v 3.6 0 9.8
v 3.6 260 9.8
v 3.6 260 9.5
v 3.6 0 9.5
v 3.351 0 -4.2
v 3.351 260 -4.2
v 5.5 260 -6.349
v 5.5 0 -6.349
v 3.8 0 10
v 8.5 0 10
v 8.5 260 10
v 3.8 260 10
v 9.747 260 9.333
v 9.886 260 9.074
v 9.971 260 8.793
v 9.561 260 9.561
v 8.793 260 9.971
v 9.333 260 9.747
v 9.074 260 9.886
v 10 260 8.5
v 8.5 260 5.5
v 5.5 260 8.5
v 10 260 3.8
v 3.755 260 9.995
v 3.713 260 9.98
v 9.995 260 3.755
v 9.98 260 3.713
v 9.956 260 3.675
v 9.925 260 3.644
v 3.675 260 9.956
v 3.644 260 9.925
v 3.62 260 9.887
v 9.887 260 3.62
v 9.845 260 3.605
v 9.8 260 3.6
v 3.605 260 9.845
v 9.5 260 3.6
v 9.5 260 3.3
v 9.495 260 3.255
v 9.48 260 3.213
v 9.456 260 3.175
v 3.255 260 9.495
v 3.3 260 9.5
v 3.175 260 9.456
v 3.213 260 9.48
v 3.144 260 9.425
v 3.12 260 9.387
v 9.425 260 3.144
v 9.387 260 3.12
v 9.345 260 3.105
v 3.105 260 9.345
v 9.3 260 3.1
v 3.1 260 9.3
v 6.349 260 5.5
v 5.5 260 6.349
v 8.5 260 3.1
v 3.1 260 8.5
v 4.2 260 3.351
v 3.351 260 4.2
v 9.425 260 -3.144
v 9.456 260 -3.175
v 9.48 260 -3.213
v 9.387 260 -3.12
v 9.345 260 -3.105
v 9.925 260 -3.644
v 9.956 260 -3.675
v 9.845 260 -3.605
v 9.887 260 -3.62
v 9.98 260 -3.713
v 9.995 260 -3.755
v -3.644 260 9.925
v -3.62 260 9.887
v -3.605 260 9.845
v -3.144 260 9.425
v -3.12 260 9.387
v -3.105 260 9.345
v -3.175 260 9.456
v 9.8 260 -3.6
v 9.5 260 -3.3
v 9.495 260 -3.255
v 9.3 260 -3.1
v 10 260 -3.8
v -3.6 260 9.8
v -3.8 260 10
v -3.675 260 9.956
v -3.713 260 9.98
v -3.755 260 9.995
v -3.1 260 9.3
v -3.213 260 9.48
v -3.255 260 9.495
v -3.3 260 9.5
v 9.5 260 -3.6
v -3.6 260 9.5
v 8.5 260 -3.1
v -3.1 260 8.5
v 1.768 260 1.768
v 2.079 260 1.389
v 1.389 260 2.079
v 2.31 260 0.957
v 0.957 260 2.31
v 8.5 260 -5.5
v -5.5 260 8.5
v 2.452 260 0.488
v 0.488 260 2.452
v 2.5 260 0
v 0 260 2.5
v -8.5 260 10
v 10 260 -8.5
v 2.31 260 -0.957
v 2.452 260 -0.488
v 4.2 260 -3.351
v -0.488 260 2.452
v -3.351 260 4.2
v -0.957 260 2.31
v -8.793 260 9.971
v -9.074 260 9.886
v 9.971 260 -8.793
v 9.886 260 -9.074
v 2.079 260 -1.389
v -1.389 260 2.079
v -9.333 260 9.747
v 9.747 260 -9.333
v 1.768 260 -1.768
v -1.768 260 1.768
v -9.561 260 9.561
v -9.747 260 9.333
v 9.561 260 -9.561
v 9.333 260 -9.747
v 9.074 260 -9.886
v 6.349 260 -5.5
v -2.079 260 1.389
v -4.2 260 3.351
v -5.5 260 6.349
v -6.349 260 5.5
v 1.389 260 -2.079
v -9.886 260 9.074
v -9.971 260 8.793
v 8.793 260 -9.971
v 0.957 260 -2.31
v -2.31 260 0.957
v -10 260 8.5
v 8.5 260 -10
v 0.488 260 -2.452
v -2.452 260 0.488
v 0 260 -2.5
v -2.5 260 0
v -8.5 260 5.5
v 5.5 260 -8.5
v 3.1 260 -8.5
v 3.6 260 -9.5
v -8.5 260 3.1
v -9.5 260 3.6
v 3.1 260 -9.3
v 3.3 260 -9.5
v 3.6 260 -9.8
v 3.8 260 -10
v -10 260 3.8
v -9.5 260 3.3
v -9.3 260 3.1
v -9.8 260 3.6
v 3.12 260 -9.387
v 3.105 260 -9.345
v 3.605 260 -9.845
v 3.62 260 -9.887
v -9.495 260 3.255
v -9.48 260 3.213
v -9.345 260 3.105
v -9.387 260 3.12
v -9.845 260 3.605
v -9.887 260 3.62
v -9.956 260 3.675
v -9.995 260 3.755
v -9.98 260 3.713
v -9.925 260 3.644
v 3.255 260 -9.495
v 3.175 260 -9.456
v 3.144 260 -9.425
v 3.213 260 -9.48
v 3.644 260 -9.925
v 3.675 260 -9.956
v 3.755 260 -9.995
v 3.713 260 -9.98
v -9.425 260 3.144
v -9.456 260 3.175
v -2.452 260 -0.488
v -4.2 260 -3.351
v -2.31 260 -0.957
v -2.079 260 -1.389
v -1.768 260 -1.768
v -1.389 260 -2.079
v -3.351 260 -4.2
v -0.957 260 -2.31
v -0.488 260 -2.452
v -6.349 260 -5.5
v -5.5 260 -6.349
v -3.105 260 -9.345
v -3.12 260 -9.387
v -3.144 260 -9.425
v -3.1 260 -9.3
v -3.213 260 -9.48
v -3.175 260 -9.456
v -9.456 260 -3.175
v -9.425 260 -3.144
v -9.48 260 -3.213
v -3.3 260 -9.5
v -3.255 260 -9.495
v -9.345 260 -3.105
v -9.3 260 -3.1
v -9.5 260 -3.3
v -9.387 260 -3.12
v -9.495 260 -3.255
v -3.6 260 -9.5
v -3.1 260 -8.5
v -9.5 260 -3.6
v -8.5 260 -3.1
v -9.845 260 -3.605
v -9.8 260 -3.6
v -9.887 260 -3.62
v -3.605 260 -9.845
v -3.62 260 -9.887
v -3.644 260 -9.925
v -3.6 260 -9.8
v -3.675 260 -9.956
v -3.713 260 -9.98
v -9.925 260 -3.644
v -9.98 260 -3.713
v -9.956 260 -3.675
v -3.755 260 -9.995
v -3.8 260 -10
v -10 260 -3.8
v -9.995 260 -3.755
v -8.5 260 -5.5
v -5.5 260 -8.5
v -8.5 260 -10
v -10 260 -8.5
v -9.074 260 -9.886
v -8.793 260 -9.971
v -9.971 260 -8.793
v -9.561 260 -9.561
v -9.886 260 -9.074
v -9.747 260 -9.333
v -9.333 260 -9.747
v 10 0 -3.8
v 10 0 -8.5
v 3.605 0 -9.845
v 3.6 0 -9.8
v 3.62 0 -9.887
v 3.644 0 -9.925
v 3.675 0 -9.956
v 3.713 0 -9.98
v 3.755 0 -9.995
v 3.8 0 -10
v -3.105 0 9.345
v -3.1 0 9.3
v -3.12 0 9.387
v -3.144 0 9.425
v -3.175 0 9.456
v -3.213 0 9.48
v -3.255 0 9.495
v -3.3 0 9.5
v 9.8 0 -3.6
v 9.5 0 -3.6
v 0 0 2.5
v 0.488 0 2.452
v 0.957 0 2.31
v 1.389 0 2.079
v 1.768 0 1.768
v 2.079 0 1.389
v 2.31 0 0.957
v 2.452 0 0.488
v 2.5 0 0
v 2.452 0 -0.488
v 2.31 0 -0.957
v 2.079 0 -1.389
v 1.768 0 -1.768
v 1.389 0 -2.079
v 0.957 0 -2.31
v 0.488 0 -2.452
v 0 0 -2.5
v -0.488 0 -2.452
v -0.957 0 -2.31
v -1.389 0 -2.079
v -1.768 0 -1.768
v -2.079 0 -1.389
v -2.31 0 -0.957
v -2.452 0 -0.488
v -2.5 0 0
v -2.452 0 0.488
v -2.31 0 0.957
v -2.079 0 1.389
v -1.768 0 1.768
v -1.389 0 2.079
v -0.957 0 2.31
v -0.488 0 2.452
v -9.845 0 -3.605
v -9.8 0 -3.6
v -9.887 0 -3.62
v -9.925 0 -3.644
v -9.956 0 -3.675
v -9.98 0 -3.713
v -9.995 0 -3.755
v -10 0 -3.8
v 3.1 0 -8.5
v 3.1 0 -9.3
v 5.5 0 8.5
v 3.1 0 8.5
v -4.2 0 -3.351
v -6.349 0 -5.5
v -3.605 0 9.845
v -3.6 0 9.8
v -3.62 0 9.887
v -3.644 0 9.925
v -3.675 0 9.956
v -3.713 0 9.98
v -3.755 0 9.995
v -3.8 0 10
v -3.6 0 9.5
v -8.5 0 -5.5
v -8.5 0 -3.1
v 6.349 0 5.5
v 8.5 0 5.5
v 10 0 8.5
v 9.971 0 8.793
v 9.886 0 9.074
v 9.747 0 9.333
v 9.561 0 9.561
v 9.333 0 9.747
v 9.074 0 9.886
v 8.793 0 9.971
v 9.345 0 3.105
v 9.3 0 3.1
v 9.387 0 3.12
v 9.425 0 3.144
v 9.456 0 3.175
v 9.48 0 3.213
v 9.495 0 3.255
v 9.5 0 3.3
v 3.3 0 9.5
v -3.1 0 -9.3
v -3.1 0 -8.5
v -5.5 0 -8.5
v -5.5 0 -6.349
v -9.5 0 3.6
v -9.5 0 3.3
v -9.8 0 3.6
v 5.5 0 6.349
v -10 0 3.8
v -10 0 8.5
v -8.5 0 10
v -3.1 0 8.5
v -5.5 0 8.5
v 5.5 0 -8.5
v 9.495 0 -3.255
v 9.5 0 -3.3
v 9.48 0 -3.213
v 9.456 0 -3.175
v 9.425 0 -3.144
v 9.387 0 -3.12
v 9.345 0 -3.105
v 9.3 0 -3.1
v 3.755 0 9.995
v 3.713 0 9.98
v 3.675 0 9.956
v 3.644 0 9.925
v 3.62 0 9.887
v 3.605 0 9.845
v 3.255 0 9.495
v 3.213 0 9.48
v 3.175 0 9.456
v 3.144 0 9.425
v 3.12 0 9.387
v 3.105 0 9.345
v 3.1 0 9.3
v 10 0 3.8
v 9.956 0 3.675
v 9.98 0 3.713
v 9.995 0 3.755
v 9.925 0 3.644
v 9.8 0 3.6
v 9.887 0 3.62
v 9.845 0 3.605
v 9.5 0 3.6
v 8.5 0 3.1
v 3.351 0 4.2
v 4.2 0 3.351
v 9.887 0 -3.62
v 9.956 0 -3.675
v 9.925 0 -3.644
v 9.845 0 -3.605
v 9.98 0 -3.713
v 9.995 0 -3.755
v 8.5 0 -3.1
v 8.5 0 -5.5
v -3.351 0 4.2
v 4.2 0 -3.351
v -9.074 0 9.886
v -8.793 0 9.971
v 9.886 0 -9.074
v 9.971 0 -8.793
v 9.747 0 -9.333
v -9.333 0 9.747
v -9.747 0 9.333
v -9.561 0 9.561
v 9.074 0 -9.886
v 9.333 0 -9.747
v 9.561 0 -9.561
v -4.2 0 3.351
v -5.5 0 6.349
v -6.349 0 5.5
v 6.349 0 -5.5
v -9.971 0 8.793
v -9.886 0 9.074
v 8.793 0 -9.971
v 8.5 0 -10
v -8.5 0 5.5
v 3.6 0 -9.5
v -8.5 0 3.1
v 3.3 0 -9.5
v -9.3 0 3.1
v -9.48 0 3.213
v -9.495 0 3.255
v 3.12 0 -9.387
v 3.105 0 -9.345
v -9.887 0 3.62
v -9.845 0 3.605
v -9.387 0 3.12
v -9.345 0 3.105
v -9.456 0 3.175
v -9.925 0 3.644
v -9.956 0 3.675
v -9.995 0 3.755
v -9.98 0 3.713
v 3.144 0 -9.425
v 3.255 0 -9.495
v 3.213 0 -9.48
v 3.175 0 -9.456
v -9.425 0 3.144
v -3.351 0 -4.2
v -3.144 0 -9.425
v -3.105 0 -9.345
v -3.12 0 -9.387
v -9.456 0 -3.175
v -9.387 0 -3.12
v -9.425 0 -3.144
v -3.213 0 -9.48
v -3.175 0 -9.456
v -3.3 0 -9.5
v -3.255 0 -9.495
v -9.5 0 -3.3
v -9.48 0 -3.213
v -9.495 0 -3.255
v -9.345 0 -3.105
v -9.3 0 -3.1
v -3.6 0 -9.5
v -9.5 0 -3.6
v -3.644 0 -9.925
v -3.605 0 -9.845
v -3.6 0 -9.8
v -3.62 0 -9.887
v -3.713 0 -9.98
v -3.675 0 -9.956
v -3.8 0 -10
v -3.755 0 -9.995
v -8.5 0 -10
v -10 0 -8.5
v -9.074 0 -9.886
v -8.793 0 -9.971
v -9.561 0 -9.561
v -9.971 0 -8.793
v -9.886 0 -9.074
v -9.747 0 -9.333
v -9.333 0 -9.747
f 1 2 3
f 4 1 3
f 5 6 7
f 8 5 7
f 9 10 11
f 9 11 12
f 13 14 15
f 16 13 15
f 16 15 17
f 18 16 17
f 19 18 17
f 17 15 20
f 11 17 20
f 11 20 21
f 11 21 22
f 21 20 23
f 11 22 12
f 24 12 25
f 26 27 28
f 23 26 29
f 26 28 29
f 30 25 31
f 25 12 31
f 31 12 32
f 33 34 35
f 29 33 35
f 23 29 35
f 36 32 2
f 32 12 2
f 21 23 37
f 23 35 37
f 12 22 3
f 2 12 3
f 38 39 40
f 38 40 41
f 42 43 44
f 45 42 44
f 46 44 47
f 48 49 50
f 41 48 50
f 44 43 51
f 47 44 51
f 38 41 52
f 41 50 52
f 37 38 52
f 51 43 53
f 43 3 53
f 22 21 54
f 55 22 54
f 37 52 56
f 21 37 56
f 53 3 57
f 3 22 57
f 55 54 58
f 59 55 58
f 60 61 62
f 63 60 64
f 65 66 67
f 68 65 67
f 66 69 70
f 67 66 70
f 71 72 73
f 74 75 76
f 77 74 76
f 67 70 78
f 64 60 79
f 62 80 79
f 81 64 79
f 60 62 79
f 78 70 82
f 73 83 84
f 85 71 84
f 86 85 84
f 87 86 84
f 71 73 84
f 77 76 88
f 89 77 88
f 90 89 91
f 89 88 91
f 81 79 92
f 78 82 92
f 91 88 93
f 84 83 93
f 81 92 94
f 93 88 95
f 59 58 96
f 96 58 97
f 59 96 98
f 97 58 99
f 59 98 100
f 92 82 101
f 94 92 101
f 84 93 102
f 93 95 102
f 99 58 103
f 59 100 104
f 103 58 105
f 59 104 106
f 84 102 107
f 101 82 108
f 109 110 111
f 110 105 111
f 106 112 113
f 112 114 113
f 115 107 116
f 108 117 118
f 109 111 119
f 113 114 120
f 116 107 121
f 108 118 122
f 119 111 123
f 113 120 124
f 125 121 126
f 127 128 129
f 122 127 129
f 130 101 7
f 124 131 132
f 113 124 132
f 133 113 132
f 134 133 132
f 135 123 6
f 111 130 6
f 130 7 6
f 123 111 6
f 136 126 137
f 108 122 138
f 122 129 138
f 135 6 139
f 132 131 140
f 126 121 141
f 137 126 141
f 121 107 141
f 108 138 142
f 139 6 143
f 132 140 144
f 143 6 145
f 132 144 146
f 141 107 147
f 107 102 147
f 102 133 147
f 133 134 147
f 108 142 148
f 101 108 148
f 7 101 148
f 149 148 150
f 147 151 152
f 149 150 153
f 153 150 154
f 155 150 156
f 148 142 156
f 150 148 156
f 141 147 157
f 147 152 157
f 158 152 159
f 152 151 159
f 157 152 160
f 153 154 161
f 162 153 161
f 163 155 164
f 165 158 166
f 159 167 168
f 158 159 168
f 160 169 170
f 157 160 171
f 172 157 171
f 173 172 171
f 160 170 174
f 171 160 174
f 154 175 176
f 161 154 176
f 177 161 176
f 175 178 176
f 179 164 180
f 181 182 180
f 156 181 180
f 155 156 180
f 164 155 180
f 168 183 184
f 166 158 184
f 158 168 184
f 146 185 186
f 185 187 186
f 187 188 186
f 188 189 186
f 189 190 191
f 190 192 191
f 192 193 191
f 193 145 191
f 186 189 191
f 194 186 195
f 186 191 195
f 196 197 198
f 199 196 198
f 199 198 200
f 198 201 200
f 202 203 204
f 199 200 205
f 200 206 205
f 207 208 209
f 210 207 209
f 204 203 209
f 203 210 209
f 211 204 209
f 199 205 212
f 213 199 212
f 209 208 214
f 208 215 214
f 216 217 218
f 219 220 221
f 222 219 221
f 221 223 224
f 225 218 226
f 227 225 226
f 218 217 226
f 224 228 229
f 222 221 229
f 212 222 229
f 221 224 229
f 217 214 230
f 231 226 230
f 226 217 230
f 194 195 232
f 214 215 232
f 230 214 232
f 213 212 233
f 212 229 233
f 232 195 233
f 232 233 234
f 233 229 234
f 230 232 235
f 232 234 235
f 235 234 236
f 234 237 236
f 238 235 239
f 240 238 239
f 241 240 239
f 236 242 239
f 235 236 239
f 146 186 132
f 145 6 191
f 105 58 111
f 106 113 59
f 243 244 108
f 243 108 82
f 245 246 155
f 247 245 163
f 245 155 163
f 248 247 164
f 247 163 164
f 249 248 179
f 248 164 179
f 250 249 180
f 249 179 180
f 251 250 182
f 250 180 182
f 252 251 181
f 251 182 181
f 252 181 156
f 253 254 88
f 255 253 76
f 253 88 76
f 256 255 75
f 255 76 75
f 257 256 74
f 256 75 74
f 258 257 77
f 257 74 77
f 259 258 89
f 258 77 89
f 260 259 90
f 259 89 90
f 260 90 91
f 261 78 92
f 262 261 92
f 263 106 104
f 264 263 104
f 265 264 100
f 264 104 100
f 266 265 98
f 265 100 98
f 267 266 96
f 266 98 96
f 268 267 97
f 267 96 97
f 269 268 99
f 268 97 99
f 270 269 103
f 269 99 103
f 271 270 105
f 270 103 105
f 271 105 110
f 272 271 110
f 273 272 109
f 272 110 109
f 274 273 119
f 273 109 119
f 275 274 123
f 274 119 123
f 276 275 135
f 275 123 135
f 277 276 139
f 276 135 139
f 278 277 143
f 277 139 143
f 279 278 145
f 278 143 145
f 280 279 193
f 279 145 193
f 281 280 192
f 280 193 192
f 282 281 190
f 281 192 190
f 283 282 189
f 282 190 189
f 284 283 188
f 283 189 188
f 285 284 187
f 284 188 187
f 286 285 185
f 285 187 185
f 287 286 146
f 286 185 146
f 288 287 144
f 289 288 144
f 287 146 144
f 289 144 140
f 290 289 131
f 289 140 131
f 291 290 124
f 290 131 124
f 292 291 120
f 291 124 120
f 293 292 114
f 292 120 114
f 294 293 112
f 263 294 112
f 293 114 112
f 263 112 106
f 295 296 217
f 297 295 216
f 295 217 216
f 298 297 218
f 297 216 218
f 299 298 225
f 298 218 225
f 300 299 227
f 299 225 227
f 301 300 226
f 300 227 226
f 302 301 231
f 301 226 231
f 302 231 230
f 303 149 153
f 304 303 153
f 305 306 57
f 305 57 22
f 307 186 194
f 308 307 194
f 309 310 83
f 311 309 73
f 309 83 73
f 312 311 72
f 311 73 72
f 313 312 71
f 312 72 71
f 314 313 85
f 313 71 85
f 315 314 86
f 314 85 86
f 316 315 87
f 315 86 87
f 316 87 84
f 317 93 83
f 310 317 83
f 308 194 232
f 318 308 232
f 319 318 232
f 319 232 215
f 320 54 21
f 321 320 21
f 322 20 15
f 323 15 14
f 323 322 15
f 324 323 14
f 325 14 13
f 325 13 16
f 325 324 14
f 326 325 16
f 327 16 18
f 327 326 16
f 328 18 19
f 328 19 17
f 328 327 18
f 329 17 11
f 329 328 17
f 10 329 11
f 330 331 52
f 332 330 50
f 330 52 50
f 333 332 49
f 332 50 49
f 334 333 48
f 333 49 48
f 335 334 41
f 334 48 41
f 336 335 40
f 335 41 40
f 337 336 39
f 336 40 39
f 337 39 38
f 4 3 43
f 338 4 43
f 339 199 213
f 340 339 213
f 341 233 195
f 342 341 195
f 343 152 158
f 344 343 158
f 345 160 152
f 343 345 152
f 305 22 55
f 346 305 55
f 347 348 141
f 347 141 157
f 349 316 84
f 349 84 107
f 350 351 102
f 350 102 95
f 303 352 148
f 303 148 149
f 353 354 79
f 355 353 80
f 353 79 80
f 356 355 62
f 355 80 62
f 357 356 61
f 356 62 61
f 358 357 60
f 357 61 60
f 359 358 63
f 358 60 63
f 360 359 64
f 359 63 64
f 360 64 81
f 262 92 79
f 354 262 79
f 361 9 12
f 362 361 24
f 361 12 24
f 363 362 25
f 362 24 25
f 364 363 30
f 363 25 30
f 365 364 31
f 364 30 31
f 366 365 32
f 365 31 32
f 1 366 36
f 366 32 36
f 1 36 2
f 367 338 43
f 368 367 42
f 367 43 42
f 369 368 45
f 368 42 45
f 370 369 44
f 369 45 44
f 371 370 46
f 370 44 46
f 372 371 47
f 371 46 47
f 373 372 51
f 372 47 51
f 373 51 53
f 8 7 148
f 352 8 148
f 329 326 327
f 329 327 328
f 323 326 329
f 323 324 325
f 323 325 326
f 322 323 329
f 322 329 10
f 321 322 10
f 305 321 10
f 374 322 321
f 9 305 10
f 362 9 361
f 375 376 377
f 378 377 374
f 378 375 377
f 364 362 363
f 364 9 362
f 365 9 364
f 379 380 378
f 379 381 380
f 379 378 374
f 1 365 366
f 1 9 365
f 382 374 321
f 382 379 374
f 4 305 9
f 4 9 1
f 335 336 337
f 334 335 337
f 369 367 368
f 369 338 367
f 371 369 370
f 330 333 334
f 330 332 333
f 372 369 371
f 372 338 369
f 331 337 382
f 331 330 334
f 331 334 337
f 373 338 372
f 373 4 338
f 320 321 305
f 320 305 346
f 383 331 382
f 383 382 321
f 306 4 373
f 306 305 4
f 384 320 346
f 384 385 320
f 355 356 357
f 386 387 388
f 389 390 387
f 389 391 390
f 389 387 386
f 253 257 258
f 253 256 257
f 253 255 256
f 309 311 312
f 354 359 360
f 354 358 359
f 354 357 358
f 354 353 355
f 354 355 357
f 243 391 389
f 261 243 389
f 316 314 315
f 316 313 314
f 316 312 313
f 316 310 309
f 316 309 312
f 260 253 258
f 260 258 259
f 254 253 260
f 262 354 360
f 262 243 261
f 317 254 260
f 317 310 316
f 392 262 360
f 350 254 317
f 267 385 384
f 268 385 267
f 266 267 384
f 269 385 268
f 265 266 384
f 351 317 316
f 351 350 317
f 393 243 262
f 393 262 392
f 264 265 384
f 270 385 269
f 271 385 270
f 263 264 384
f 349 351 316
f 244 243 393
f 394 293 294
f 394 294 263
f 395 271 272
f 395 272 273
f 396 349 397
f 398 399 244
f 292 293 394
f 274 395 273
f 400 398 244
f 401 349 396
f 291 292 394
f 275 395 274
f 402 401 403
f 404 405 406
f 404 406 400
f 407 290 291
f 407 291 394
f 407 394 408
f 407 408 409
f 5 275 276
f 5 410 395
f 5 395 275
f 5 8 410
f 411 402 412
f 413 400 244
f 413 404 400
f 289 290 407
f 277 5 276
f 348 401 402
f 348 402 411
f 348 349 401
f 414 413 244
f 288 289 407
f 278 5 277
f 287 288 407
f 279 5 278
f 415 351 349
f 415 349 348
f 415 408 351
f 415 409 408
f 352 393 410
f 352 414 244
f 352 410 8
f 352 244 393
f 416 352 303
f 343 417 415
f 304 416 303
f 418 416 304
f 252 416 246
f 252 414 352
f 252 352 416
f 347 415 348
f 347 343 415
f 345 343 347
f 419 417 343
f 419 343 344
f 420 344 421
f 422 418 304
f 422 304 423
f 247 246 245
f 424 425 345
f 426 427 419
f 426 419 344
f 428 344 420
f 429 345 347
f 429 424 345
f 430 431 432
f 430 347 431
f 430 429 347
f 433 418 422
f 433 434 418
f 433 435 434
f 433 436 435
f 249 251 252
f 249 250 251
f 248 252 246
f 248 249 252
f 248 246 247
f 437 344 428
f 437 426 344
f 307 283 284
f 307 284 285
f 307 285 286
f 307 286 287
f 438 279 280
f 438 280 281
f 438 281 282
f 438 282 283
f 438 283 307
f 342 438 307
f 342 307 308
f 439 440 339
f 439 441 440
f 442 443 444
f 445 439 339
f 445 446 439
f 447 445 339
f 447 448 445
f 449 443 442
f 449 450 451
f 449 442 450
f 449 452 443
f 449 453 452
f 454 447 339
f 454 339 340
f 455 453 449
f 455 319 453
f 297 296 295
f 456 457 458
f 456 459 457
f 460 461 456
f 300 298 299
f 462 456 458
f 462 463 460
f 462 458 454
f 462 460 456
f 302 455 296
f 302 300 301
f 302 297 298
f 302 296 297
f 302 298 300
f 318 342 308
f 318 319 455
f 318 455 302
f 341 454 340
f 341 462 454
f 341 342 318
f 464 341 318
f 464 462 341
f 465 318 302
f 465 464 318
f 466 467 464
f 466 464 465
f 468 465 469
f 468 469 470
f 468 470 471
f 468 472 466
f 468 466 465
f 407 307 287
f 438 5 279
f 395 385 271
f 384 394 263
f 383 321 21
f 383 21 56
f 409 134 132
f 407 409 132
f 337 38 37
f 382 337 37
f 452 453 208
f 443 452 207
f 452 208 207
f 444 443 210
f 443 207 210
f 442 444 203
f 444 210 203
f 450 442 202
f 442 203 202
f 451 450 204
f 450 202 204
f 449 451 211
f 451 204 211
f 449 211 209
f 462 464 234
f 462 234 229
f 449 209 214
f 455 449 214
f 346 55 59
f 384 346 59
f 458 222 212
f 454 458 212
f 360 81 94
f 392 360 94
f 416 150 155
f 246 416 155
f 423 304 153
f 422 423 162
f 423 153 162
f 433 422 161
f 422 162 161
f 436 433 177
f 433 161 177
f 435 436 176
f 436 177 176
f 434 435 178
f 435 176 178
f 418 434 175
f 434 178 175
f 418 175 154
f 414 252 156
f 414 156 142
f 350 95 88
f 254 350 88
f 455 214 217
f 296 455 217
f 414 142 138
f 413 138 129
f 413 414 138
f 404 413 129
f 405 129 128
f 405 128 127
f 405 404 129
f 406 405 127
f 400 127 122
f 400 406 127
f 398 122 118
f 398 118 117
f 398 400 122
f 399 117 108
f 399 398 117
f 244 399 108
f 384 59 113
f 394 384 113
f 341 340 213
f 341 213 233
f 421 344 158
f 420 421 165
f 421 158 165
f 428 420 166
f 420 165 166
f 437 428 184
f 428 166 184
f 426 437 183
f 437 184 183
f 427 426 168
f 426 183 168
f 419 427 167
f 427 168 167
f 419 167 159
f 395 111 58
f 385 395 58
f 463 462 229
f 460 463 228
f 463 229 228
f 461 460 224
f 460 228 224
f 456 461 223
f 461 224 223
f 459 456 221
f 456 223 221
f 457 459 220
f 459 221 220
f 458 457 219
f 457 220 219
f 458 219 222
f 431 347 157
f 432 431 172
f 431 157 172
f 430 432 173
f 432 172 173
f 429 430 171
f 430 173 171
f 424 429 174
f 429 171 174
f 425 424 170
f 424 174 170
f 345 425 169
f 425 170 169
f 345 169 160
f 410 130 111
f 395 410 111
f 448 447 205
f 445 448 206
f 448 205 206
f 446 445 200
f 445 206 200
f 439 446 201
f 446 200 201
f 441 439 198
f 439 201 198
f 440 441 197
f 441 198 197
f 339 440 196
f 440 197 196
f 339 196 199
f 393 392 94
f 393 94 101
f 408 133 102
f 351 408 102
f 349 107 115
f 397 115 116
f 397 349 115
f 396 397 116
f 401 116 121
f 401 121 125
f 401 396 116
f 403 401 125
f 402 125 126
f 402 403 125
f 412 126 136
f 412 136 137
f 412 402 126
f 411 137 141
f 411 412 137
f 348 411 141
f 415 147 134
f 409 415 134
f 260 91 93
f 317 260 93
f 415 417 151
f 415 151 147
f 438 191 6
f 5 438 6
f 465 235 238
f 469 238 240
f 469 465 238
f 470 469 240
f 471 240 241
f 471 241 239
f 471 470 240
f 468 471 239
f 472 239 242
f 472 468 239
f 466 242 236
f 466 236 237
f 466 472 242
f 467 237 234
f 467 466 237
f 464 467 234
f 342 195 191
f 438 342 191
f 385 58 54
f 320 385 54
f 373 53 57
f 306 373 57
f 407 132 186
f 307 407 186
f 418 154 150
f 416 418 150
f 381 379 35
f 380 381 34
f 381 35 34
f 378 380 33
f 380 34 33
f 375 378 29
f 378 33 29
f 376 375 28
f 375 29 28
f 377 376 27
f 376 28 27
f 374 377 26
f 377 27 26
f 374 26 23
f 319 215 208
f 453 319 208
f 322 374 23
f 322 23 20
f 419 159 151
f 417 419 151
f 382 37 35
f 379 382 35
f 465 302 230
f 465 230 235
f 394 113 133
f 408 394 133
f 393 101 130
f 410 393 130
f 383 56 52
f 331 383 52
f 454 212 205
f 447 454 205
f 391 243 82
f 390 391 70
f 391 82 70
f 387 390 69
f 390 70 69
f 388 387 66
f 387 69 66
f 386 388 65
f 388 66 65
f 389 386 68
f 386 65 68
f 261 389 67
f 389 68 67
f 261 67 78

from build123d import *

# Parameters (mm, degrees)
BOSS_EXTRUDE1_DEPTH = 260
SKETCH3_R           = 2.5
CUT_EXTRUDE1_DEPTH  = 261.384331326
CIRPATTERN1_COUNT   = 4


with BuildPart() as part:
    # Sketch2 → Boss-Extrude1 (new body)
    with BuildSketch(Plane(origin=(0, 0, 0), x_dir=(1, 0, 0), z_dir=(0, 1, 0))):
        with BuildLine():
            Line((-10, -8.5), (-10, 8.5))
            ThreePointArc((-10, 8.5), (-9.560660172, 9.560660172), (-8.5, 10))
            Line((-8.5, 10), (8.5, 10))
            ThreePointArc((8.5, 10), (9.560660172, 9.560660172), (10, 8.5))
            Line((10, 8.5), (10, -8.5))
            ThreePointArc((10, -8.5), (9.560660172, -9.560660172), (8.5, -10))
            Line((8.5, -10), (-8.5, -10))
            ThreePointArc((-8.5, -10), (-9.560660172, -9.560660172), (-10, -8.5))
        make_face()
    extrude(amount=BOSS_EXTRUDE1_DEPTH)

    # Sketch3 → Cut-Extrude1 (cut, through all)
    with BuildSketch(Plane(origin=(0, 260, 0), x_dir=(1, 0, 0), z_dir=(0, 1, 0))):
        with BuildLine():
            Line((-6.348528137, -5.5), (-4.2, -3.351471863))
            Line((-4.2, -3.351471863), (-4.2, 3.351471863))
            Line((-4.2, 3.351471863), (-6.348528137, 5.5))
            Line((-6.348528137, 5.5), (-8.5, 5.5))
            Line((-8.5, 5.5), (-8.5, 3.1))
            Line((-8.5, 3.1), (-9.3, 3.1))
            ThreePointArc((-9.3, 3.1), (-9.441421356, 3.158578644), (-9.5, 3.3))
            Line((-9.5, 3.3), (-9.5, 3.6))
            Line((-9.5, 3.6), (-9.8, 3.6))
            ThreePointArc((-9.8, 3.6), (-9.941421356, 3.658578644), (-10, 3.8))
            Line((-10, 3.8), (-10, -3.8))
            ThreePointArc((-10, -3.8), (-9.941421356, -3.658578644), (-9.8, -3.6))
            Line((-9.8, -3.6), (-9.5, -3.6))
            Line((-9.5, -3.6), (-9.5, -3.3))
            ThreePointArc((-9.5, -3.3), (-9.441421356, -3.158578644), (-9.3, -3.1))
            Line((-9.3, -3.1), (-8.5, -3.1))
            Line((-8.5, -3.1), (-8.5, -5.5))
            Line((-8.5, -5.5), (-6.348528137, -5.5))
        make_face()
        Circle(SKETCH3_R)
    cut_extrude1 = extrude(amount=-CUT_EXTRUDE1_DEPTH, mode=Mode.SUBTRACT)

    # CirPattern1: Cut-Extrude1 ×4 about axis
    cirpattern1_axis = Axis((0, -20, 0), (0, 1, 0))
    for i in range(1, CIRPATTERN1_COUNT):
        add(cut_extrude1.rotate(cirpattern1_axis, i * 360 / CIRPATTERN1_COUNT), mode=Mode.SUBTRACT)


solid = part.part
